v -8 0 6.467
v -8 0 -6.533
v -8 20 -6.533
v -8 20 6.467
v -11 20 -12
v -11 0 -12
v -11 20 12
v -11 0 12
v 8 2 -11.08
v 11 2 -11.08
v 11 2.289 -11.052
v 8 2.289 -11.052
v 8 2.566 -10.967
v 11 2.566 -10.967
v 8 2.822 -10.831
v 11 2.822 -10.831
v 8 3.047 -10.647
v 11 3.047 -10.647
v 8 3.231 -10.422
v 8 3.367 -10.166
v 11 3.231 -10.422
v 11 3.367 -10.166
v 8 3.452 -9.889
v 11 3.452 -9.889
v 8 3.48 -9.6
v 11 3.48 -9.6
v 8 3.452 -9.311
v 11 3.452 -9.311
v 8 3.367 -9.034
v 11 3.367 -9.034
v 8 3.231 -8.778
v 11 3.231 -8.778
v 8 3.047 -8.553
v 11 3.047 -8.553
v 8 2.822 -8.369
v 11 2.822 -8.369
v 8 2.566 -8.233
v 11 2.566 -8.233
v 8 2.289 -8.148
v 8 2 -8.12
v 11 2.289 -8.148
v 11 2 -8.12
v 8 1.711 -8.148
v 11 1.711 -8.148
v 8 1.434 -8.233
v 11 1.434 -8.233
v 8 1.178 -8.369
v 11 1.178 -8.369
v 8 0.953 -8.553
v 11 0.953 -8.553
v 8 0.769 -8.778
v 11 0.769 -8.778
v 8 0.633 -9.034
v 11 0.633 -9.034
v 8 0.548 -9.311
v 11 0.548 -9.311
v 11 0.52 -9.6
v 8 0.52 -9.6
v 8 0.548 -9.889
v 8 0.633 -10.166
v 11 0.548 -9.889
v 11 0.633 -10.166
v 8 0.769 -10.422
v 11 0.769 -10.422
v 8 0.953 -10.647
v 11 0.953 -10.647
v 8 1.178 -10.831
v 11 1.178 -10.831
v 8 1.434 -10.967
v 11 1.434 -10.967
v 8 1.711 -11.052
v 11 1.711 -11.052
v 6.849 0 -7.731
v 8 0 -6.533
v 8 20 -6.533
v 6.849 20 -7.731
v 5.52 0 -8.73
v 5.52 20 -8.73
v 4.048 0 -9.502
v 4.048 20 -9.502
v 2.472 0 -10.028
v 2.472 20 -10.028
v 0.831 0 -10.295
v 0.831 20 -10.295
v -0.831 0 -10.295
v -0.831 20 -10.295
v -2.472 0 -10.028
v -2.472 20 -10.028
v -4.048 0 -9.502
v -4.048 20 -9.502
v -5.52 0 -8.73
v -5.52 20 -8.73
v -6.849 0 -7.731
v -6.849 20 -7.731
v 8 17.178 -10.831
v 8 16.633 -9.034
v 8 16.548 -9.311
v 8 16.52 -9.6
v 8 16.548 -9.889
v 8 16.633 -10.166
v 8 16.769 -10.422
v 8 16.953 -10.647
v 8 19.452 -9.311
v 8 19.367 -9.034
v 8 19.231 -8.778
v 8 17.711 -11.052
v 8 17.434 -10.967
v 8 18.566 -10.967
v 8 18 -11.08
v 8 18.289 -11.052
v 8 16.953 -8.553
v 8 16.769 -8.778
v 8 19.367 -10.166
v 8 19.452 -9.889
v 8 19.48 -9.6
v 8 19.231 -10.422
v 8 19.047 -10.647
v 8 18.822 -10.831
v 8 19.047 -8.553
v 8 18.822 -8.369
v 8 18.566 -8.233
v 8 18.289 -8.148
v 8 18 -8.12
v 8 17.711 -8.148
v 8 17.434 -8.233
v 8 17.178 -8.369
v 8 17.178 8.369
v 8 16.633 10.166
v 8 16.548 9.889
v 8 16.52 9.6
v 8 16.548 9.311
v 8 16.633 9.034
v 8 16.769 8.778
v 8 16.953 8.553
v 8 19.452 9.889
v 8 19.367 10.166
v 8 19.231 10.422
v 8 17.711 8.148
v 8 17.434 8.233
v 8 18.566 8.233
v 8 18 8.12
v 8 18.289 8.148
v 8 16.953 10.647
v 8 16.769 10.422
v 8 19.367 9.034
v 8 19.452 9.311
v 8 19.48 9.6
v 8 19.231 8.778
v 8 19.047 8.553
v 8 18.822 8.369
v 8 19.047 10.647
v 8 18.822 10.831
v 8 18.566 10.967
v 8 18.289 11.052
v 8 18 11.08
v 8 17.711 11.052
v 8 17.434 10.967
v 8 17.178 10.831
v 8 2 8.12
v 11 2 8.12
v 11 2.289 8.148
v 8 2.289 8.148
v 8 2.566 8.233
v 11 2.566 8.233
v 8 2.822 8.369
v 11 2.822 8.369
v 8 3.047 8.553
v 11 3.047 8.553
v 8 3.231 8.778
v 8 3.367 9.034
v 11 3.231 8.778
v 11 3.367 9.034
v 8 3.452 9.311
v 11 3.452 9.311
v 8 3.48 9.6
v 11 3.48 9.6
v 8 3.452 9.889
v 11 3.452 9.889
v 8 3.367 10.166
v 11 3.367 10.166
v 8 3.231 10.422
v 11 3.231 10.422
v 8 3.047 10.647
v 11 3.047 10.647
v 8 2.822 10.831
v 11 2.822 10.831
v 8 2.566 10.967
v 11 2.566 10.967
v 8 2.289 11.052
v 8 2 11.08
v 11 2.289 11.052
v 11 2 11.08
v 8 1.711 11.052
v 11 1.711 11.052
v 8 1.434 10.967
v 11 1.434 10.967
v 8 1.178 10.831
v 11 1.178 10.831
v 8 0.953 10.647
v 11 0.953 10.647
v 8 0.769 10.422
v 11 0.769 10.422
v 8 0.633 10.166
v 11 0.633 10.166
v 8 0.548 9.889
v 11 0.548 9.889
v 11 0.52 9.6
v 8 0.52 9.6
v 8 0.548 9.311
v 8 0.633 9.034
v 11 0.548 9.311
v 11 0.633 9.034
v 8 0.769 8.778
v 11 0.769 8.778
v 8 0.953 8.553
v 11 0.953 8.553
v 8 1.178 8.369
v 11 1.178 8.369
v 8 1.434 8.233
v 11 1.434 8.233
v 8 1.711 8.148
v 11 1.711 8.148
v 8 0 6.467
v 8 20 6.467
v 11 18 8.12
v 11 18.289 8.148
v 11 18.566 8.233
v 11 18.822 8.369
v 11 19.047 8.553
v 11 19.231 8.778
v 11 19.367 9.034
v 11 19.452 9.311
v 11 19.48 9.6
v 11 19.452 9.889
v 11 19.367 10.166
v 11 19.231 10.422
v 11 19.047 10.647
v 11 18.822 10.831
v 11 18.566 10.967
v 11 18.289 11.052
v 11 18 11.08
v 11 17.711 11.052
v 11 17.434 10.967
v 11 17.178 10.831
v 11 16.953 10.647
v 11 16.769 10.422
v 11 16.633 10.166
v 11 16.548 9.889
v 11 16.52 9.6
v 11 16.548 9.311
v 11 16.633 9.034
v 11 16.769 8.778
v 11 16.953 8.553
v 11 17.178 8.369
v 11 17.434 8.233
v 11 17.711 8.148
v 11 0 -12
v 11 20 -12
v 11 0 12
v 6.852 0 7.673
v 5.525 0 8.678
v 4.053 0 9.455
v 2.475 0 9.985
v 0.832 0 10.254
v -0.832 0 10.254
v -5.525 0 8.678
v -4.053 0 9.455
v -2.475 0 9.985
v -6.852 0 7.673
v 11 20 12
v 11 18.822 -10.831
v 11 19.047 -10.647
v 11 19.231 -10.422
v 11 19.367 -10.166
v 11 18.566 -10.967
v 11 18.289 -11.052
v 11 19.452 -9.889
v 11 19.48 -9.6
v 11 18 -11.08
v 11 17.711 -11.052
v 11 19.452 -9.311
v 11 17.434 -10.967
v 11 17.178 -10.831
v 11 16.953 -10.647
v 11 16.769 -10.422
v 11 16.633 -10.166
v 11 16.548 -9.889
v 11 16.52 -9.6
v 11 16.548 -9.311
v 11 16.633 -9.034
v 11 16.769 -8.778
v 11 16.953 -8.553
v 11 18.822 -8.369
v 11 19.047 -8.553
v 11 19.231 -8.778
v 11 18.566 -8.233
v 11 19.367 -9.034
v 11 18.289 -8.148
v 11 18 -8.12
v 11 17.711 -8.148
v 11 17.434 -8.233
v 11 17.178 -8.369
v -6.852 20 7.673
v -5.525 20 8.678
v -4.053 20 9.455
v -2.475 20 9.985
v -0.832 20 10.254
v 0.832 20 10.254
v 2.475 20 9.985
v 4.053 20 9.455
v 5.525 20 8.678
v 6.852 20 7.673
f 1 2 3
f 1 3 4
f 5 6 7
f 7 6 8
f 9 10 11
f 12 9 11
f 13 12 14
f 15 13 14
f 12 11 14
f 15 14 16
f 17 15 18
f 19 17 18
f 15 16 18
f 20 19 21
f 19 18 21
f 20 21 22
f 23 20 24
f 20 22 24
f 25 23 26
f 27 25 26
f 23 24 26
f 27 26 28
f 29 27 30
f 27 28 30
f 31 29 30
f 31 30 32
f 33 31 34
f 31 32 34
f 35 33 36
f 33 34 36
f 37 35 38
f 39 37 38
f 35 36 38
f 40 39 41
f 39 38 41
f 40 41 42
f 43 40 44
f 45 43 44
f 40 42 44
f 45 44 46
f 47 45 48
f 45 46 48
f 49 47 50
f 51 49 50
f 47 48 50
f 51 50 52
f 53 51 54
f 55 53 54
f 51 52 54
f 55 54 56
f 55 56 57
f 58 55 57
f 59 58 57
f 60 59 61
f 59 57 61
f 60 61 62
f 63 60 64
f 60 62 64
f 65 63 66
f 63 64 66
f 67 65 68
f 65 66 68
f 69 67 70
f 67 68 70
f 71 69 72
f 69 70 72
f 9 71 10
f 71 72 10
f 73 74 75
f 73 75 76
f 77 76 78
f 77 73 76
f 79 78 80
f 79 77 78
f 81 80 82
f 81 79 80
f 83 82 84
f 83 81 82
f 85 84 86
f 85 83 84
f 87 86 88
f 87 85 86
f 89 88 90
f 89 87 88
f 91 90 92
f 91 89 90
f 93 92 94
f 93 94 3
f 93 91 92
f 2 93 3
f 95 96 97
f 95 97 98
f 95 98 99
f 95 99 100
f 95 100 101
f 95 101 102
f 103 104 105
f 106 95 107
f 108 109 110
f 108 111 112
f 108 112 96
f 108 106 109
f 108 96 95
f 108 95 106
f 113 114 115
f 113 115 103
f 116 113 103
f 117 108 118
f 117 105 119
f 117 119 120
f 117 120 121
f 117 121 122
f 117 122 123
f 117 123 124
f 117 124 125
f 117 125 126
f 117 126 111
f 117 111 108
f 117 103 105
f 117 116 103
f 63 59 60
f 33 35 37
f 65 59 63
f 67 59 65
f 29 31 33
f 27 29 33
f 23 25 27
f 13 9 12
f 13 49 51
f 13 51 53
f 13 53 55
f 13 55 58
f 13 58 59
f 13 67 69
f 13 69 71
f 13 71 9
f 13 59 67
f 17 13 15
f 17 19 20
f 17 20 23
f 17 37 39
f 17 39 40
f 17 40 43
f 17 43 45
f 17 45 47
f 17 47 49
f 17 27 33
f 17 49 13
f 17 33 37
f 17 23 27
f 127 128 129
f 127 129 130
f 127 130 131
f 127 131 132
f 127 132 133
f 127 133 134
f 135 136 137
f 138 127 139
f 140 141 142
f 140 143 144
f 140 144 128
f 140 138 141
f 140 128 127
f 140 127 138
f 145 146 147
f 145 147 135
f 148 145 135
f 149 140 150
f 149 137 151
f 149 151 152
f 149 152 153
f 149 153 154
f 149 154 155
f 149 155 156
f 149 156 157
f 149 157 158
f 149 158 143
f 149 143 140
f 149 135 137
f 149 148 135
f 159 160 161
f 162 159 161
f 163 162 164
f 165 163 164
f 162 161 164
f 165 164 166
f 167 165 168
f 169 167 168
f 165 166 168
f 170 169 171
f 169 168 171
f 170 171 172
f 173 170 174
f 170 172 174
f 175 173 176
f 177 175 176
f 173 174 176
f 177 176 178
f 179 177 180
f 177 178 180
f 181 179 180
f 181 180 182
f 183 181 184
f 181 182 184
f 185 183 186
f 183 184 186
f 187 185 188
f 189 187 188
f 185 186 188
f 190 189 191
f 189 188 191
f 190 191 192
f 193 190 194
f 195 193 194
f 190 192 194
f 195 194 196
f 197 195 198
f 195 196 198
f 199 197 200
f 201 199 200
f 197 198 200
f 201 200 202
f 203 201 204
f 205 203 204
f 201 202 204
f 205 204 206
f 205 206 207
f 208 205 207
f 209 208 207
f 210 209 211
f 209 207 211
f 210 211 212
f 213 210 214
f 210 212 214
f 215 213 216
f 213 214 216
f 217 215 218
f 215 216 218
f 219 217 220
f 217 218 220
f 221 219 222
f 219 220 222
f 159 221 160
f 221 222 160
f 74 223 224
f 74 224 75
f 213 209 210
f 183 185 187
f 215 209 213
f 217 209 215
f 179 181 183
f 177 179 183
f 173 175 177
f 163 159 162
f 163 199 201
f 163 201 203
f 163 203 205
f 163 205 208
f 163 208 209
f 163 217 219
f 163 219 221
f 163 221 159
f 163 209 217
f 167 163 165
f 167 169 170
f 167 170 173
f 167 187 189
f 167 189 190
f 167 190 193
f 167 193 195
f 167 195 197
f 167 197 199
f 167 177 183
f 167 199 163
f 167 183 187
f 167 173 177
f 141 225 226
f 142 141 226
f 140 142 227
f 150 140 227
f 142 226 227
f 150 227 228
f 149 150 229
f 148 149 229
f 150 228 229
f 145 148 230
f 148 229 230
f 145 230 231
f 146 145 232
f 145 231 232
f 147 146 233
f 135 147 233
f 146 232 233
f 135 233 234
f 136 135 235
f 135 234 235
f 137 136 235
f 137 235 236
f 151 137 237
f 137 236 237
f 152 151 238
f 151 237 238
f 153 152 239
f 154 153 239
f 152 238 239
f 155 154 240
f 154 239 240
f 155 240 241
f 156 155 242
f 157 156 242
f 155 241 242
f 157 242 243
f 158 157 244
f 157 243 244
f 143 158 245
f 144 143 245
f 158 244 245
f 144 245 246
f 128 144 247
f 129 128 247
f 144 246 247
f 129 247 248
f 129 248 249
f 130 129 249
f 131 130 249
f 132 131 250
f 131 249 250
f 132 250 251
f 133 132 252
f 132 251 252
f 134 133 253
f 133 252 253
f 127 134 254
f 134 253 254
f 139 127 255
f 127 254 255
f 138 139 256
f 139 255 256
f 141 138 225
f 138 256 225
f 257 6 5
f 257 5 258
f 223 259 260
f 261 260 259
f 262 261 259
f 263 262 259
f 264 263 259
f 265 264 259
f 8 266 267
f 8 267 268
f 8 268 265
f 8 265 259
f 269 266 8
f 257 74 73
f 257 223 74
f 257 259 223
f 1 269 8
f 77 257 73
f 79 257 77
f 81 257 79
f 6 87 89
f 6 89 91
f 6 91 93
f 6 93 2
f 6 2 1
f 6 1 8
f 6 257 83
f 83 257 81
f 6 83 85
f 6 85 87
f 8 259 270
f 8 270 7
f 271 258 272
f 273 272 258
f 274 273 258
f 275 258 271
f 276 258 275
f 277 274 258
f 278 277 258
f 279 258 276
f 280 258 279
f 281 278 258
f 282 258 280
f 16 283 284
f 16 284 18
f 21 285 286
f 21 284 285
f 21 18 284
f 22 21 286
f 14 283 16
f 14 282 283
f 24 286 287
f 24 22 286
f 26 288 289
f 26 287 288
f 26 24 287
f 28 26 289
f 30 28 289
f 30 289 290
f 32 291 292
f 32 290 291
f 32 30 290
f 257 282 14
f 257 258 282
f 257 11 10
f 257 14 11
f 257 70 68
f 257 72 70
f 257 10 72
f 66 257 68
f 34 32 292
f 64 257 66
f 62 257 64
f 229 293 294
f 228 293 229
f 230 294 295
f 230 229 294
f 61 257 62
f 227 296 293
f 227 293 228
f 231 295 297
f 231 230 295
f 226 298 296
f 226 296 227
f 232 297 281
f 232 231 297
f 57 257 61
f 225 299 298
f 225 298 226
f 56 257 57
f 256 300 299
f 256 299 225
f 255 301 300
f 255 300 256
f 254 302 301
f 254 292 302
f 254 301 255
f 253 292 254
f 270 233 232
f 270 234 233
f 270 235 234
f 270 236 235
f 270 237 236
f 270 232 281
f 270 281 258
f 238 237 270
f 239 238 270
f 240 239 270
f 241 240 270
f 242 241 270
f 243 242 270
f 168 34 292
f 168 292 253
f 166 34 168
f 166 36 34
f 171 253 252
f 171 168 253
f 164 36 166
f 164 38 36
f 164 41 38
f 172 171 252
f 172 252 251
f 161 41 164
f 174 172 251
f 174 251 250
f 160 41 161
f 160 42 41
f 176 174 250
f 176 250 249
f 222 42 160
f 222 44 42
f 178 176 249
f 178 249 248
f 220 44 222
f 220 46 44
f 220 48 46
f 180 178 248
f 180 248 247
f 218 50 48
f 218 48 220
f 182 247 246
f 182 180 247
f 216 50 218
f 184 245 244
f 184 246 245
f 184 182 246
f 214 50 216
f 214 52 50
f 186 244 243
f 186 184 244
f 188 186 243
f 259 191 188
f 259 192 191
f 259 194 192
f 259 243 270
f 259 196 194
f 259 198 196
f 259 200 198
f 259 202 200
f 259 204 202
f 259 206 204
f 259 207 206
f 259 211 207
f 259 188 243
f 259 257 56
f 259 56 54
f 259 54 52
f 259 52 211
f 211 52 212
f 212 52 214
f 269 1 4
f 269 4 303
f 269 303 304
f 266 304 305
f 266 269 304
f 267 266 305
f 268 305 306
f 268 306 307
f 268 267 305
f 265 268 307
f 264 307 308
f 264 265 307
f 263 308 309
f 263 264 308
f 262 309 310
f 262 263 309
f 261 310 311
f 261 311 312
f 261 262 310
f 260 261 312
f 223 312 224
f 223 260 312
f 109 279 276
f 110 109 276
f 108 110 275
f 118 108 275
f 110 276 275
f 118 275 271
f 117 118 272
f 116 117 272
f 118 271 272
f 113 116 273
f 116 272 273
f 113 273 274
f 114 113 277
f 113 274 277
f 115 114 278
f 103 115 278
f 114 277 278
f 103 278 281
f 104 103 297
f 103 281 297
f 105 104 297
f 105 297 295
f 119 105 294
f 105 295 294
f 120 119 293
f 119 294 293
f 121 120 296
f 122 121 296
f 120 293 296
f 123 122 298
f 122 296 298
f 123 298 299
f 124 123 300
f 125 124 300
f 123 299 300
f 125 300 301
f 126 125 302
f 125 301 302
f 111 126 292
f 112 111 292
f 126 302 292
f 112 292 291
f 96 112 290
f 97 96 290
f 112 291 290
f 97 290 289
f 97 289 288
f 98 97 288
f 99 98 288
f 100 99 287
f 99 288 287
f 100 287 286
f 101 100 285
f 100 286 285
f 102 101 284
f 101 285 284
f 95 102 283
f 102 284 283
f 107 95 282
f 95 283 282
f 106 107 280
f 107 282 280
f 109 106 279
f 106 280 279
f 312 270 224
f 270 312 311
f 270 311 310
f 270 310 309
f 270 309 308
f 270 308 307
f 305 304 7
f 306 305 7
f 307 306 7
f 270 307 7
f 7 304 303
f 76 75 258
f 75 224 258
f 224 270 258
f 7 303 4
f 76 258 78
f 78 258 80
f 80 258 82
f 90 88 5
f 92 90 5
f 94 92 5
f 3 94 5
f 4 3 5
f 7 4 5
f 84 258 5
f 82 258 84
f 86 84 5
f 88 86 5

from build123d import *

# Parameters (mm, degrees)
BOSS_EXTRUDE1_DEPTH = 20
SKETCH2_R           = 1.48
CUT_EXTRUDE1_DEPTH  = 3


with BuildPart() as part:
    # Sketch1 → Boss-Extrude1 (new body)
    with BuildSketch(Plane(origin=(0, 0, 0), x_dir=(1, 0, 0), z_dir=(0, 1, 0))):
        Polygon((-11, 0), (-11, 12), (11, 12), (11, -12), (-11, -12), align=None)
        with BuildLine():
            Line((-8, 6.532500515), (-8, -6.467499485))
            ThreePointArc((-8, -6.467499485), (0, -10.287300403), (8, -6.467499485))
            Line((8, -6.467499485), (8, 6.532500515))
            ThreePointArc((8, 6.532500515), (0, 10.328289451), (-8, 6.532500515))
        make_face(mode=Mode.SUBTRACT)
    extrude(amount=BOSS_EXTRUDE1_DEPTH)

    # Sketch2 → Cut-Extrude1 (cut)
    with BuildSketch(Plane(origin=(11, 0, 0), x_dir=(0, 0, -1), z_dir=(1, 0, 0))):
        with Locations((-9.6, 18)):
            Circle(SKETCH2_R)
        with Locations((9.6, 18)):
            Circle(SKETCH2_R)
        with Locations((9.6, 2)):
            Circle(SKETCH2_R)
        with Locations((-9.6, 2)):
            Circle(SKETCH2_R)
    extrude(amount=-CUT_EXTRUDE1_DEPTH, mode=Mode.SUBTRACT)


solid = part.part
